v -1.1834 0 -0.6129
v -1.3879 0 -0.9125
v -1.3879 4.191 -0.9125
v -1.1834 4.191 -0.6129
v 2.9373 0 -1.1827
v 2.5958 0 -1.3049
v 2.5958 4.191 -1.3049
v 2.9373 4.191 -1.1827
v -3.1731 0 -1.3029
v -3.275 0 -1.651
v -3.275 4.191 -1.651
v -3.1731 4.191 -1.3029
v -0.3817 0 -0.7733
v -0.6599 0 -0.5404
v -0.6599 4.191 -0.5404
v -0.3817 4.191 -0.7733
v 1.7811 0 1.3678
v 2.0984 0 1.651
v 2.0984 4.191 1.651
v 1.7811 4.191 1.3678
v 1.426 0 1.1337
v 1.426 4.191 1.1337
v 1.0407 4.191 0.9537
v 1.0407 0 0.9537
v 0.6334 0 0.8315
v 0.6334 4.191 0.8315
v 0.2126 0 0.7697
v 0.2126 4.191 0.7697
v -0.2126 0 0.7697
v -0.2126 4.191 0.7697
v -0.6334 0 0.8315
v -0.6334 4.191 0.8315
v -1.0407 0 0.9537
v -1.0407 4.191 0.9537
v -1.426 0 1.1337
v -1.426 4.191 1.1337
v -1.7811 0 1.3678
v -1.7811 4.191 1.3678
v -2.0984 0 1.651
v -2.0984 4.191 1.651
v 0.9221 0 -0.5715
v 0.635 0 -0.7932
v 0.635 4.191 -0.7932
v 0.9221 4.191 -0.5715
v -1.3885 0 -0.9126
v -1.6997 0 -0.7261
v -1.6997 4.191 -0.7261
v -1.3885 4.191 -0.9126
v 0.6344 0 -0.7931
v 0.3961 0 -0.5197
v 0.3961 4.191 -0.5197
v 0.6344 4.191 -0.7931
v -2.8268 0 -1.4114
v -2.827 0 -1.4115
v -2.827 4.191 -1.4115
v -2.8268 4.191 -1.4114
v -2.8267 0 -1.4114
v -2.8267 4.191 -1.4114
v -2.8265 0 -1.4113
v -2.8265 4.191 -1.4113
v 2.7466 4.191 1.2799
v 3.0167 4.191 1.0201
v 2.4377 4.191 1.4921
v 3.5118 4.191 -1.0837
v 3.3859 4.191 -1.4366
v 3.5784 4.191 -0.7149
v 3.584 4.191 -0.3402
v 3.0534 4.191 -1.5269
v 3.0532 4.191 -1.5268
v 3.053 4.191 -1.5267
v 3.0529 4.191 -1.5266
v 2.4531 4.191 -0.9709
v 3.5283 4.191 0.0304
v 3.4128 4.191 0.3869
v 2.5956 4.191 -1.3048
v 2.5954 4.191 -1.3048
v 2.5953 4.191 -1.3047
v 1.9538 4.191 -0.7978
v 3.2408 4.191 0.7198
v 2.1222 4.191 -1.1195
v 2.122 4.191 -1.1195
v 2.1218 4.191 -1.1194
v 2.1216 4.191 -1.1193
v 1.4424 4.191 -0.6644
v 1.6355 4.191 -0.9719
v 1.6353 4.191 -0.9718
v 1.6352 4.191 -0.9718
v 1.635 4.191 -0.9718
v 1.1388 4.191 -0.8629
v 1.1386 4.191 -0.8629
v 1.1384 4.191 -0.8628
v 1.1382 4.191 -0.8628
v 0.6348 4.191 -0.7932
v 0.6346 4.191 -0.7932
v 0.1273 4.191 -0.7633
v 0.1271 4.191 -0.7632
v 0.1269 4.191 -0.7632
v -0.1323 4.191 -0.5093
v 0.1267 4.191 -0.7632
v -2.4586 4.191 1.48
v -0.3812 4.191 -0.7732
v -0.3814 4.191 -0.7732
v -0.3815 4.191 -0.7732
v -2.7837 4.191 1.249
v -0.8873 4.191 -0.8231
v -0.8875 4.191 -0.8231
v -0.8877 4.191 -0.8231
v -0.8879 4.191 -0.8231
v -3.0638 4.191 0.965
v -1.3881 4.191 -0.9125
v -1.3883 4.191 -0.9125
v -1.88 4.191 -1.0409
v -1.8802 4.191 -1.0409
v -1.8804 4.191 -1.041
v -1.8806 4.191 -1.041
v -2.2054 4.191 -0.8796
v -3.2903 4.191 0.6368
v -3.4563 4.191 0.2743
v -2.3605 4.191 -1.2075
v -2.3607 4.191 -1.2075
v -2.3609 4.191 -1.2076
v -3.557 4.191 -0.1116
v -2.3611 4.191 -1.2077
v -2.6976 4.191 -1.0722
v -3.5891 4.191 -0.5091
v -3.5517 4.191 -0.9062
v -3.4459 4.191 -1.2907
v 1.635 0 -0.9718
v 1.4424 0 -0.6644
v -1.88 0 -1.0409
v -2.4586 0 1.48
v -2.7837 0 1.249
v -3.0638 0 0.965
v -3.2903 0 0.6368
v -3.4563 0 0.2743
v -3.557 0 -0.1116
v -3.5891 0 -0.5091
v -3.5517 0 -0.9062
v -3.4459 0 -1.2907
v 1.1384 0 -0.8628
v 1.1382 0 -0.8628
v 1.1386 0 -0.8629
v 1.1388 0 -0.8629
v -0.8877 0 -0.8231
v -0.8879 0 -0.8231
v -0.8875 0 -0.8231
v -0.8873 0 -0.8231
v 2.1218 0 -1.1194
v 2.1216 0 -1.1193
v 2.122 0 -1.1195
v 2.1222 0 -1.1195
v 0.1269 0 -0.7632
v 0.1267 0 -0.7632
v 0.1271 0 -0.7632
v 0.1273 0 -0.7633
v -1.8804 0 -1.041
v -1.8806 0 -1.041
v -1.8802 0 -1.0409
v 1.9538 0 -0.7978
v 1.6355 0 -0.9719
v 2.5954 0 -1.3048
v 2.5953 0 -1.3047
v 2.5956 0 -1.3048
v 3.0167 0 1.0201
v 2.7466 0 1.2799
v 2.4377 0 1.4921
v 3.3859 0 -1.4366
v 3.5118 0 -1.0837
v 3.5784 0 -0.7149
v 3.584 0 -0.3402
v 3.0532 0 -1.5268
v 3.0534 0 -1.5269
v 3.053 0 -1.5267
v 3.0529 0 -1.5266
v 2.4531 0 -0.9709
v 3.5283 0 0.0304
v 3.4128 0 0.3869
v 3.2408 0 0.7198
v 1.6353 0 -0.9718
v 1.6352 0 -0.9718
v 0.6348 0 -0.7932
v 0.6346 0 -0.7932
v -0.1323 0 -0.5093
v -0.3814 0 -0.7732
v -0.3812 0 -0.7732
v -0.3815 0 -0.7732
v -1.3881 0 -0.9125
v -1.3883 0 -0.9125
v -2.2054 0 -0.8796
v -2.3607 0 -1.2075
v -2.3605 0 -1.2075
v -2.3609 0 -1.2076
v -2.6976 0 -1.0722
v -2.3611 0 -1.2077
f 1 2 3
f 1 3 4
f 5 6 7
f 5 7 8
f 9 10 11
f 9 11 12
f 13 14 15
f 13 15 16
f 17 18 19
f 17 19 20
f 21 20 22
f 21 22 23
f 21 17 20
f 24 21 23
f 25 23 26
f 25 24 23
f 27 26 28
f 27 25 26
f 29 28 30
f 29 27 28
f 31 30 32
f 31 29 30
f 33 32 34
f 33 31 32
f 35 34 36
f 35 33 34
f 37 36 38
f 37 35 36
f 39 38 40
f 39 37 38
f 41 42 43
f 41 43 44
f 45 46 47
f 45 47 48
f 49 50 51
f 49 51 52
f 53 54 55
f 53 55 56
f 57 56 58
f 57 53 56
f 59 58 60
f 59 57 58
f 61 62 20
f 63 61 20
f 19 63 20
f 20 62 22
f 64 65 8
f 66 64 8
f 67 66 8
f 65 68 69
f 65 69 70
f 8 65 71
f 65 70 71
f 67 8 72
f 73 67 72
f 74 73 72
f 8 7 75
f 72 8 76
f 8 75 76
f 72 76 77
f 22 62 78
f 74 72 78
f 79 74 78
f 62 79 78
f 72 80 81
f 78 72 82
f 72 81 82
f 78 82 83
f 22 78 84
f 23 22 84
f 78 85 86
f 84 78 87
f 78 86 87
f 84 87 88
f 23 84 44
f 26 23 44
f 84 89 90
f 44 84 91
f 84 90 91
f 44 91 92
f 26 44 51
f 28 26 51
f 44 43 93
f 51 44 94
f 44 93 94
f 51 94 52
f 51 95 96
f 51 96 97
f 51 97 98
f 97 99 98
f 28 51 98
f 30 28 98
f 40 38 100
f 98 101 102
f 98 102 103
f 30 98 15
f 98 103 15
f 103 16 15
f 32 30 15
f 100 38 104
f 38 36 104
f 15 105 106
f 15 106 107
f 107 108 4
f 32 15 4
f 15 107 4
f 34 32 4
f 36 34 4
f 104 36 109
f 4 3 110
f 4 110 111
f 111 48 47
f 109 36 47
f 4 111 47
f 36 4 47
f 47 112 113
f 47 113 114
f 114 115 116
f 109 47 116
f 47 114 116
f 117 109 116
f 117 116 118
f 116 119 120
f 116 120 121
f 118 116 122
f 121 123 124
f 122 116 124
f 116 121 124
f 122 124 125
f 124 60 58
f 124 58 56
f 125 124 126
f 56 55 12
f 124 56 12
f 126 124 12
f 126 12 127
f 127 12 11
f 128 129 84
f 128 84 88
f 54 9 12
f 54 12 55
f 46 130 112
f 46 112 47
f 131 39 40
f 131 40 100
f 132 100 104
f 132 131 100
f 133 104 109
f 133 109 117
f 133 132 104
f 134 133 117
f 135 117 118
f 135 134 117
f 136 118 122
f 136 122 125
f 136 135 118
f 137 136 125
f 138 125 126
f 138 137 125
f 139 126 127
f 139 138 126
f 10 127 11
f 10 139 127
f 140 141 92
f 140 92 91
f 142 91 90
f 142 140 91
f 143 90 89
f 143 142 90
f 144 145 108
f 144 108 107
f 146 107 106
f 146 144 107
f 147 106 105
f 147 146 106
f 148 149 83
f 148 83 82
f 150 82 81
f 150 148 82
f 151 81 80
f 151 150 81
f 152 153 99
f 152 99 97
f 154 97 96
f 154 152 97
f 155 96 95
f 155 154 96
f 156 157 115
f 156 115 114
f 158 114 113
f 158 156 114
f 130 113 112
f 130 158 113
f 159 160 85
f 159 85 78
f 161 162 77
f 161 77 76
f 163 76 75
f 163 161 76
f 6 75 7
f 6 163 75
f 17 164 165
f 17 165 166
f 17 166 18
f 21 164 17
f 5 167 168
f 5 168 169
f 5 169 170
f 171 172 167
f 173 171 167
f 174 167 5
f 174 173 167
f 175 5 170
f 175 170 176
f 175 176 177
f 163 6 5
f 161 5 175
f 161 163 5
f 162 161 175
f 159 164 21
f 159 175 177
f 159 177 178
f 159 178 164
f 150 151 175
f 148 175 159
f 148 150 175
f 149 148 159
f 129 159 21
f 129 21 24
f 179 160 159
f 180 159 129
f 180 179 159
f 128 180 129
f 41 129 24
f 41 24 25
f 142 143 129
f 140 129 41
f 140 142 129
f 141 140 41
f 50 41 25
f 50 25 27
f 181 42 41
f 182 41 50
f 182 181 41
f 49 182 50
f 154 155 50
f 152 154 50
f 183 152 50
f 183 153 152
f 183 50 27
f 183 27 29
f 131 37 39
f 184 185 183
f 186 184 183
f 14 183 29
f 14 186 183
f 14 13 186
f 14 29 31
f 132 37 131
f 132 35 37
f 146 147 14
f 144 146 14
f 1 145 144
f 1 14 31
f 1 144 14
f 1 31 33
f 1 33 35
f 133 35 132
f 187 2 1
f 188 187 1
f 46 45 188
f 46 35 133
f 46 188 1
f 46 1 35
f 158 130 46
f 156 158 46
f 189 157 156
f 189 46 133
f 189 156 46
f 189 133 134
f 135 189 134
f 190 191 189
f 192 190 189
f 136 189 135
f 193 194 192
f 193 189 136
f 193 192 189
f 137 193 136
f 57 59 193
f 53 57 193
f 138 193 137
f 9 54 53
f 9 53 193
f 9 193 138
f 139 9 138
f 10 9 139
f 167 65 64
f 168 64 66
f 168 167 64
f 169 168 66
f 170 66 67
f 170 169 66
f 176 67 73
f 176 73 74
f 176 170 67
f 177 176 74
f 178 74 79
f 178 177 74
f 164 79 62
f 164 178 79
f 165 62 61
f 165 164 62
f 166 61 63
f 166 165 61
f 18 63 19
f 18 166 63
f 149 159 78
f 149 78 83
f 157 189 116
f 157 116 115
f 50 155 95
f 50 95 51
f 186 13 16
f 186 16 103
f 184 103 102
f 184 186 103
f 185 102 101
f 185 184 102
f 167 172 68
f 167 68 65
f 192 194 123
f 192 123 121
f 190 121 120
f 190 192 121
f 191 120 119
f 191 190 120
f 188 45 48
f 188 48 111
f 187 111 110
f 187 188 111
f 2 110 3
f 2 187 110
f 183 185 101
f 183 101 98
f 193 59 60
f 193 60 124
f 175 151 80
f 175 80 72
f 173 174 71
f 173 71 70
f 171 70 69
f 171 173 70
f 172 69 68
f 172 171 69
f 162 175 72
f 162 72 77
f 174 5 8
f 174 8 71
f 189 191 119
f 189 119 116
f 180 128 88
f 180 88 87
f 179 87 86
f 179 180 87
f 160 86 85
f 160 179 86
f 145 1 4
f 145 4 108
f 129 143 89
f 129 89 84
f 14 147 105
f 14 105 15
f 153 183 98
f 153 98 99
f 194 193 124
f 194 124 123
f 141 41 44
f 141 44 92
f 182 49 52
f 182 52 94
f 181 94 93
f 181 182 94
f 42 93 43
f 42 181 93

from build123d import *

# Parameters (mm, degrees)
BOSS_EXTRUDE1_DEPTH = 4.191
CUT_EXTRUDE1_START  = -4.191
CUT_EXTRUDE1_DEPTH  = 4.191
CIRPATTERN1_COUNT   = 15
CIRPATTERN1_ANGLE   = 63


with BuildPart() as part:
    # Sketch1 → Boss-Extrude1 (new body)
    with BuildSketch(Plane(origin=(0, 0, 0), x_dir=(1, 0, 0), z_dir=(0, 1, 0))):
        with BuildLine():
            ThreePointArc((-3.275024427, 1.651), (0, 0.762), (3.275024427, 1.651))
            ThreePointArc((3.275024427, 1.651), (3.45634833, -0.274256168), (2.098384379, -1.651))
            ThreePointArc((2.098384379, -1.651), (0, -0.762), (-2.098384379, -1.651))
            ThreePointArc((-2.098384379, -1.651), (-3.45634833, -0.274256168), (-3.275024427, 1.651))
        make_face()
    extrude(amount=BOSS_EXTRUDE1_DEPTH)

    # Sketch2 → Cut-Extrude1 (cut)
    with BuildSketch(Plane(origin=(0, 4.191, 0), x_dir=(1, 0, 0), z_dir=(0, 1, 0)).offset(CUT_EXTRUDE1_START)):
        with BuildLine():
            ThreePointArc((-3.053367923, 1.526866132), (-3.16480485, 1.587846201), (-3.275024427, 1.651))
            Line((-3.275024427, 1.651), (-3.173107841, 1.302860882))
            Line((-3.173107841, 1.302860882), (-3.053367923, 1.526866132))
        make_face()
        with BuildLine():
            Line((-3.053367923, 1.526866132), (-3.173107841, 1.302860882))
            Line((-3.173107841, 1.302860882), (-2.827013928, 1.411520163))
            ThreePointArc((-2.827013928, 1.411520163), (-2.94075651, 1.468083249), (-3.053367923, 1.526866132))
        make_face()
    cut_extrude1 = extrude(amount=CUT_EXTRUDE1_DEPTH, mode=Mode.SUBTRACT)

    # CirPattern1: Cut-Extrude1 ×15 about axis
    cirpattern1_axis = Axis((0, 0, -7.239), (0, 1, 0))
    for i in range(1, CIRPATTERN1_COUNT):
        add(cut_extrude1.rotate(cirpattern1_axis, i * CIRPATTERN1_ANGLE / (CIRPATTERN1_COUNT - 1)), mode=Mode.SUBTRACT)


solid = part.part
